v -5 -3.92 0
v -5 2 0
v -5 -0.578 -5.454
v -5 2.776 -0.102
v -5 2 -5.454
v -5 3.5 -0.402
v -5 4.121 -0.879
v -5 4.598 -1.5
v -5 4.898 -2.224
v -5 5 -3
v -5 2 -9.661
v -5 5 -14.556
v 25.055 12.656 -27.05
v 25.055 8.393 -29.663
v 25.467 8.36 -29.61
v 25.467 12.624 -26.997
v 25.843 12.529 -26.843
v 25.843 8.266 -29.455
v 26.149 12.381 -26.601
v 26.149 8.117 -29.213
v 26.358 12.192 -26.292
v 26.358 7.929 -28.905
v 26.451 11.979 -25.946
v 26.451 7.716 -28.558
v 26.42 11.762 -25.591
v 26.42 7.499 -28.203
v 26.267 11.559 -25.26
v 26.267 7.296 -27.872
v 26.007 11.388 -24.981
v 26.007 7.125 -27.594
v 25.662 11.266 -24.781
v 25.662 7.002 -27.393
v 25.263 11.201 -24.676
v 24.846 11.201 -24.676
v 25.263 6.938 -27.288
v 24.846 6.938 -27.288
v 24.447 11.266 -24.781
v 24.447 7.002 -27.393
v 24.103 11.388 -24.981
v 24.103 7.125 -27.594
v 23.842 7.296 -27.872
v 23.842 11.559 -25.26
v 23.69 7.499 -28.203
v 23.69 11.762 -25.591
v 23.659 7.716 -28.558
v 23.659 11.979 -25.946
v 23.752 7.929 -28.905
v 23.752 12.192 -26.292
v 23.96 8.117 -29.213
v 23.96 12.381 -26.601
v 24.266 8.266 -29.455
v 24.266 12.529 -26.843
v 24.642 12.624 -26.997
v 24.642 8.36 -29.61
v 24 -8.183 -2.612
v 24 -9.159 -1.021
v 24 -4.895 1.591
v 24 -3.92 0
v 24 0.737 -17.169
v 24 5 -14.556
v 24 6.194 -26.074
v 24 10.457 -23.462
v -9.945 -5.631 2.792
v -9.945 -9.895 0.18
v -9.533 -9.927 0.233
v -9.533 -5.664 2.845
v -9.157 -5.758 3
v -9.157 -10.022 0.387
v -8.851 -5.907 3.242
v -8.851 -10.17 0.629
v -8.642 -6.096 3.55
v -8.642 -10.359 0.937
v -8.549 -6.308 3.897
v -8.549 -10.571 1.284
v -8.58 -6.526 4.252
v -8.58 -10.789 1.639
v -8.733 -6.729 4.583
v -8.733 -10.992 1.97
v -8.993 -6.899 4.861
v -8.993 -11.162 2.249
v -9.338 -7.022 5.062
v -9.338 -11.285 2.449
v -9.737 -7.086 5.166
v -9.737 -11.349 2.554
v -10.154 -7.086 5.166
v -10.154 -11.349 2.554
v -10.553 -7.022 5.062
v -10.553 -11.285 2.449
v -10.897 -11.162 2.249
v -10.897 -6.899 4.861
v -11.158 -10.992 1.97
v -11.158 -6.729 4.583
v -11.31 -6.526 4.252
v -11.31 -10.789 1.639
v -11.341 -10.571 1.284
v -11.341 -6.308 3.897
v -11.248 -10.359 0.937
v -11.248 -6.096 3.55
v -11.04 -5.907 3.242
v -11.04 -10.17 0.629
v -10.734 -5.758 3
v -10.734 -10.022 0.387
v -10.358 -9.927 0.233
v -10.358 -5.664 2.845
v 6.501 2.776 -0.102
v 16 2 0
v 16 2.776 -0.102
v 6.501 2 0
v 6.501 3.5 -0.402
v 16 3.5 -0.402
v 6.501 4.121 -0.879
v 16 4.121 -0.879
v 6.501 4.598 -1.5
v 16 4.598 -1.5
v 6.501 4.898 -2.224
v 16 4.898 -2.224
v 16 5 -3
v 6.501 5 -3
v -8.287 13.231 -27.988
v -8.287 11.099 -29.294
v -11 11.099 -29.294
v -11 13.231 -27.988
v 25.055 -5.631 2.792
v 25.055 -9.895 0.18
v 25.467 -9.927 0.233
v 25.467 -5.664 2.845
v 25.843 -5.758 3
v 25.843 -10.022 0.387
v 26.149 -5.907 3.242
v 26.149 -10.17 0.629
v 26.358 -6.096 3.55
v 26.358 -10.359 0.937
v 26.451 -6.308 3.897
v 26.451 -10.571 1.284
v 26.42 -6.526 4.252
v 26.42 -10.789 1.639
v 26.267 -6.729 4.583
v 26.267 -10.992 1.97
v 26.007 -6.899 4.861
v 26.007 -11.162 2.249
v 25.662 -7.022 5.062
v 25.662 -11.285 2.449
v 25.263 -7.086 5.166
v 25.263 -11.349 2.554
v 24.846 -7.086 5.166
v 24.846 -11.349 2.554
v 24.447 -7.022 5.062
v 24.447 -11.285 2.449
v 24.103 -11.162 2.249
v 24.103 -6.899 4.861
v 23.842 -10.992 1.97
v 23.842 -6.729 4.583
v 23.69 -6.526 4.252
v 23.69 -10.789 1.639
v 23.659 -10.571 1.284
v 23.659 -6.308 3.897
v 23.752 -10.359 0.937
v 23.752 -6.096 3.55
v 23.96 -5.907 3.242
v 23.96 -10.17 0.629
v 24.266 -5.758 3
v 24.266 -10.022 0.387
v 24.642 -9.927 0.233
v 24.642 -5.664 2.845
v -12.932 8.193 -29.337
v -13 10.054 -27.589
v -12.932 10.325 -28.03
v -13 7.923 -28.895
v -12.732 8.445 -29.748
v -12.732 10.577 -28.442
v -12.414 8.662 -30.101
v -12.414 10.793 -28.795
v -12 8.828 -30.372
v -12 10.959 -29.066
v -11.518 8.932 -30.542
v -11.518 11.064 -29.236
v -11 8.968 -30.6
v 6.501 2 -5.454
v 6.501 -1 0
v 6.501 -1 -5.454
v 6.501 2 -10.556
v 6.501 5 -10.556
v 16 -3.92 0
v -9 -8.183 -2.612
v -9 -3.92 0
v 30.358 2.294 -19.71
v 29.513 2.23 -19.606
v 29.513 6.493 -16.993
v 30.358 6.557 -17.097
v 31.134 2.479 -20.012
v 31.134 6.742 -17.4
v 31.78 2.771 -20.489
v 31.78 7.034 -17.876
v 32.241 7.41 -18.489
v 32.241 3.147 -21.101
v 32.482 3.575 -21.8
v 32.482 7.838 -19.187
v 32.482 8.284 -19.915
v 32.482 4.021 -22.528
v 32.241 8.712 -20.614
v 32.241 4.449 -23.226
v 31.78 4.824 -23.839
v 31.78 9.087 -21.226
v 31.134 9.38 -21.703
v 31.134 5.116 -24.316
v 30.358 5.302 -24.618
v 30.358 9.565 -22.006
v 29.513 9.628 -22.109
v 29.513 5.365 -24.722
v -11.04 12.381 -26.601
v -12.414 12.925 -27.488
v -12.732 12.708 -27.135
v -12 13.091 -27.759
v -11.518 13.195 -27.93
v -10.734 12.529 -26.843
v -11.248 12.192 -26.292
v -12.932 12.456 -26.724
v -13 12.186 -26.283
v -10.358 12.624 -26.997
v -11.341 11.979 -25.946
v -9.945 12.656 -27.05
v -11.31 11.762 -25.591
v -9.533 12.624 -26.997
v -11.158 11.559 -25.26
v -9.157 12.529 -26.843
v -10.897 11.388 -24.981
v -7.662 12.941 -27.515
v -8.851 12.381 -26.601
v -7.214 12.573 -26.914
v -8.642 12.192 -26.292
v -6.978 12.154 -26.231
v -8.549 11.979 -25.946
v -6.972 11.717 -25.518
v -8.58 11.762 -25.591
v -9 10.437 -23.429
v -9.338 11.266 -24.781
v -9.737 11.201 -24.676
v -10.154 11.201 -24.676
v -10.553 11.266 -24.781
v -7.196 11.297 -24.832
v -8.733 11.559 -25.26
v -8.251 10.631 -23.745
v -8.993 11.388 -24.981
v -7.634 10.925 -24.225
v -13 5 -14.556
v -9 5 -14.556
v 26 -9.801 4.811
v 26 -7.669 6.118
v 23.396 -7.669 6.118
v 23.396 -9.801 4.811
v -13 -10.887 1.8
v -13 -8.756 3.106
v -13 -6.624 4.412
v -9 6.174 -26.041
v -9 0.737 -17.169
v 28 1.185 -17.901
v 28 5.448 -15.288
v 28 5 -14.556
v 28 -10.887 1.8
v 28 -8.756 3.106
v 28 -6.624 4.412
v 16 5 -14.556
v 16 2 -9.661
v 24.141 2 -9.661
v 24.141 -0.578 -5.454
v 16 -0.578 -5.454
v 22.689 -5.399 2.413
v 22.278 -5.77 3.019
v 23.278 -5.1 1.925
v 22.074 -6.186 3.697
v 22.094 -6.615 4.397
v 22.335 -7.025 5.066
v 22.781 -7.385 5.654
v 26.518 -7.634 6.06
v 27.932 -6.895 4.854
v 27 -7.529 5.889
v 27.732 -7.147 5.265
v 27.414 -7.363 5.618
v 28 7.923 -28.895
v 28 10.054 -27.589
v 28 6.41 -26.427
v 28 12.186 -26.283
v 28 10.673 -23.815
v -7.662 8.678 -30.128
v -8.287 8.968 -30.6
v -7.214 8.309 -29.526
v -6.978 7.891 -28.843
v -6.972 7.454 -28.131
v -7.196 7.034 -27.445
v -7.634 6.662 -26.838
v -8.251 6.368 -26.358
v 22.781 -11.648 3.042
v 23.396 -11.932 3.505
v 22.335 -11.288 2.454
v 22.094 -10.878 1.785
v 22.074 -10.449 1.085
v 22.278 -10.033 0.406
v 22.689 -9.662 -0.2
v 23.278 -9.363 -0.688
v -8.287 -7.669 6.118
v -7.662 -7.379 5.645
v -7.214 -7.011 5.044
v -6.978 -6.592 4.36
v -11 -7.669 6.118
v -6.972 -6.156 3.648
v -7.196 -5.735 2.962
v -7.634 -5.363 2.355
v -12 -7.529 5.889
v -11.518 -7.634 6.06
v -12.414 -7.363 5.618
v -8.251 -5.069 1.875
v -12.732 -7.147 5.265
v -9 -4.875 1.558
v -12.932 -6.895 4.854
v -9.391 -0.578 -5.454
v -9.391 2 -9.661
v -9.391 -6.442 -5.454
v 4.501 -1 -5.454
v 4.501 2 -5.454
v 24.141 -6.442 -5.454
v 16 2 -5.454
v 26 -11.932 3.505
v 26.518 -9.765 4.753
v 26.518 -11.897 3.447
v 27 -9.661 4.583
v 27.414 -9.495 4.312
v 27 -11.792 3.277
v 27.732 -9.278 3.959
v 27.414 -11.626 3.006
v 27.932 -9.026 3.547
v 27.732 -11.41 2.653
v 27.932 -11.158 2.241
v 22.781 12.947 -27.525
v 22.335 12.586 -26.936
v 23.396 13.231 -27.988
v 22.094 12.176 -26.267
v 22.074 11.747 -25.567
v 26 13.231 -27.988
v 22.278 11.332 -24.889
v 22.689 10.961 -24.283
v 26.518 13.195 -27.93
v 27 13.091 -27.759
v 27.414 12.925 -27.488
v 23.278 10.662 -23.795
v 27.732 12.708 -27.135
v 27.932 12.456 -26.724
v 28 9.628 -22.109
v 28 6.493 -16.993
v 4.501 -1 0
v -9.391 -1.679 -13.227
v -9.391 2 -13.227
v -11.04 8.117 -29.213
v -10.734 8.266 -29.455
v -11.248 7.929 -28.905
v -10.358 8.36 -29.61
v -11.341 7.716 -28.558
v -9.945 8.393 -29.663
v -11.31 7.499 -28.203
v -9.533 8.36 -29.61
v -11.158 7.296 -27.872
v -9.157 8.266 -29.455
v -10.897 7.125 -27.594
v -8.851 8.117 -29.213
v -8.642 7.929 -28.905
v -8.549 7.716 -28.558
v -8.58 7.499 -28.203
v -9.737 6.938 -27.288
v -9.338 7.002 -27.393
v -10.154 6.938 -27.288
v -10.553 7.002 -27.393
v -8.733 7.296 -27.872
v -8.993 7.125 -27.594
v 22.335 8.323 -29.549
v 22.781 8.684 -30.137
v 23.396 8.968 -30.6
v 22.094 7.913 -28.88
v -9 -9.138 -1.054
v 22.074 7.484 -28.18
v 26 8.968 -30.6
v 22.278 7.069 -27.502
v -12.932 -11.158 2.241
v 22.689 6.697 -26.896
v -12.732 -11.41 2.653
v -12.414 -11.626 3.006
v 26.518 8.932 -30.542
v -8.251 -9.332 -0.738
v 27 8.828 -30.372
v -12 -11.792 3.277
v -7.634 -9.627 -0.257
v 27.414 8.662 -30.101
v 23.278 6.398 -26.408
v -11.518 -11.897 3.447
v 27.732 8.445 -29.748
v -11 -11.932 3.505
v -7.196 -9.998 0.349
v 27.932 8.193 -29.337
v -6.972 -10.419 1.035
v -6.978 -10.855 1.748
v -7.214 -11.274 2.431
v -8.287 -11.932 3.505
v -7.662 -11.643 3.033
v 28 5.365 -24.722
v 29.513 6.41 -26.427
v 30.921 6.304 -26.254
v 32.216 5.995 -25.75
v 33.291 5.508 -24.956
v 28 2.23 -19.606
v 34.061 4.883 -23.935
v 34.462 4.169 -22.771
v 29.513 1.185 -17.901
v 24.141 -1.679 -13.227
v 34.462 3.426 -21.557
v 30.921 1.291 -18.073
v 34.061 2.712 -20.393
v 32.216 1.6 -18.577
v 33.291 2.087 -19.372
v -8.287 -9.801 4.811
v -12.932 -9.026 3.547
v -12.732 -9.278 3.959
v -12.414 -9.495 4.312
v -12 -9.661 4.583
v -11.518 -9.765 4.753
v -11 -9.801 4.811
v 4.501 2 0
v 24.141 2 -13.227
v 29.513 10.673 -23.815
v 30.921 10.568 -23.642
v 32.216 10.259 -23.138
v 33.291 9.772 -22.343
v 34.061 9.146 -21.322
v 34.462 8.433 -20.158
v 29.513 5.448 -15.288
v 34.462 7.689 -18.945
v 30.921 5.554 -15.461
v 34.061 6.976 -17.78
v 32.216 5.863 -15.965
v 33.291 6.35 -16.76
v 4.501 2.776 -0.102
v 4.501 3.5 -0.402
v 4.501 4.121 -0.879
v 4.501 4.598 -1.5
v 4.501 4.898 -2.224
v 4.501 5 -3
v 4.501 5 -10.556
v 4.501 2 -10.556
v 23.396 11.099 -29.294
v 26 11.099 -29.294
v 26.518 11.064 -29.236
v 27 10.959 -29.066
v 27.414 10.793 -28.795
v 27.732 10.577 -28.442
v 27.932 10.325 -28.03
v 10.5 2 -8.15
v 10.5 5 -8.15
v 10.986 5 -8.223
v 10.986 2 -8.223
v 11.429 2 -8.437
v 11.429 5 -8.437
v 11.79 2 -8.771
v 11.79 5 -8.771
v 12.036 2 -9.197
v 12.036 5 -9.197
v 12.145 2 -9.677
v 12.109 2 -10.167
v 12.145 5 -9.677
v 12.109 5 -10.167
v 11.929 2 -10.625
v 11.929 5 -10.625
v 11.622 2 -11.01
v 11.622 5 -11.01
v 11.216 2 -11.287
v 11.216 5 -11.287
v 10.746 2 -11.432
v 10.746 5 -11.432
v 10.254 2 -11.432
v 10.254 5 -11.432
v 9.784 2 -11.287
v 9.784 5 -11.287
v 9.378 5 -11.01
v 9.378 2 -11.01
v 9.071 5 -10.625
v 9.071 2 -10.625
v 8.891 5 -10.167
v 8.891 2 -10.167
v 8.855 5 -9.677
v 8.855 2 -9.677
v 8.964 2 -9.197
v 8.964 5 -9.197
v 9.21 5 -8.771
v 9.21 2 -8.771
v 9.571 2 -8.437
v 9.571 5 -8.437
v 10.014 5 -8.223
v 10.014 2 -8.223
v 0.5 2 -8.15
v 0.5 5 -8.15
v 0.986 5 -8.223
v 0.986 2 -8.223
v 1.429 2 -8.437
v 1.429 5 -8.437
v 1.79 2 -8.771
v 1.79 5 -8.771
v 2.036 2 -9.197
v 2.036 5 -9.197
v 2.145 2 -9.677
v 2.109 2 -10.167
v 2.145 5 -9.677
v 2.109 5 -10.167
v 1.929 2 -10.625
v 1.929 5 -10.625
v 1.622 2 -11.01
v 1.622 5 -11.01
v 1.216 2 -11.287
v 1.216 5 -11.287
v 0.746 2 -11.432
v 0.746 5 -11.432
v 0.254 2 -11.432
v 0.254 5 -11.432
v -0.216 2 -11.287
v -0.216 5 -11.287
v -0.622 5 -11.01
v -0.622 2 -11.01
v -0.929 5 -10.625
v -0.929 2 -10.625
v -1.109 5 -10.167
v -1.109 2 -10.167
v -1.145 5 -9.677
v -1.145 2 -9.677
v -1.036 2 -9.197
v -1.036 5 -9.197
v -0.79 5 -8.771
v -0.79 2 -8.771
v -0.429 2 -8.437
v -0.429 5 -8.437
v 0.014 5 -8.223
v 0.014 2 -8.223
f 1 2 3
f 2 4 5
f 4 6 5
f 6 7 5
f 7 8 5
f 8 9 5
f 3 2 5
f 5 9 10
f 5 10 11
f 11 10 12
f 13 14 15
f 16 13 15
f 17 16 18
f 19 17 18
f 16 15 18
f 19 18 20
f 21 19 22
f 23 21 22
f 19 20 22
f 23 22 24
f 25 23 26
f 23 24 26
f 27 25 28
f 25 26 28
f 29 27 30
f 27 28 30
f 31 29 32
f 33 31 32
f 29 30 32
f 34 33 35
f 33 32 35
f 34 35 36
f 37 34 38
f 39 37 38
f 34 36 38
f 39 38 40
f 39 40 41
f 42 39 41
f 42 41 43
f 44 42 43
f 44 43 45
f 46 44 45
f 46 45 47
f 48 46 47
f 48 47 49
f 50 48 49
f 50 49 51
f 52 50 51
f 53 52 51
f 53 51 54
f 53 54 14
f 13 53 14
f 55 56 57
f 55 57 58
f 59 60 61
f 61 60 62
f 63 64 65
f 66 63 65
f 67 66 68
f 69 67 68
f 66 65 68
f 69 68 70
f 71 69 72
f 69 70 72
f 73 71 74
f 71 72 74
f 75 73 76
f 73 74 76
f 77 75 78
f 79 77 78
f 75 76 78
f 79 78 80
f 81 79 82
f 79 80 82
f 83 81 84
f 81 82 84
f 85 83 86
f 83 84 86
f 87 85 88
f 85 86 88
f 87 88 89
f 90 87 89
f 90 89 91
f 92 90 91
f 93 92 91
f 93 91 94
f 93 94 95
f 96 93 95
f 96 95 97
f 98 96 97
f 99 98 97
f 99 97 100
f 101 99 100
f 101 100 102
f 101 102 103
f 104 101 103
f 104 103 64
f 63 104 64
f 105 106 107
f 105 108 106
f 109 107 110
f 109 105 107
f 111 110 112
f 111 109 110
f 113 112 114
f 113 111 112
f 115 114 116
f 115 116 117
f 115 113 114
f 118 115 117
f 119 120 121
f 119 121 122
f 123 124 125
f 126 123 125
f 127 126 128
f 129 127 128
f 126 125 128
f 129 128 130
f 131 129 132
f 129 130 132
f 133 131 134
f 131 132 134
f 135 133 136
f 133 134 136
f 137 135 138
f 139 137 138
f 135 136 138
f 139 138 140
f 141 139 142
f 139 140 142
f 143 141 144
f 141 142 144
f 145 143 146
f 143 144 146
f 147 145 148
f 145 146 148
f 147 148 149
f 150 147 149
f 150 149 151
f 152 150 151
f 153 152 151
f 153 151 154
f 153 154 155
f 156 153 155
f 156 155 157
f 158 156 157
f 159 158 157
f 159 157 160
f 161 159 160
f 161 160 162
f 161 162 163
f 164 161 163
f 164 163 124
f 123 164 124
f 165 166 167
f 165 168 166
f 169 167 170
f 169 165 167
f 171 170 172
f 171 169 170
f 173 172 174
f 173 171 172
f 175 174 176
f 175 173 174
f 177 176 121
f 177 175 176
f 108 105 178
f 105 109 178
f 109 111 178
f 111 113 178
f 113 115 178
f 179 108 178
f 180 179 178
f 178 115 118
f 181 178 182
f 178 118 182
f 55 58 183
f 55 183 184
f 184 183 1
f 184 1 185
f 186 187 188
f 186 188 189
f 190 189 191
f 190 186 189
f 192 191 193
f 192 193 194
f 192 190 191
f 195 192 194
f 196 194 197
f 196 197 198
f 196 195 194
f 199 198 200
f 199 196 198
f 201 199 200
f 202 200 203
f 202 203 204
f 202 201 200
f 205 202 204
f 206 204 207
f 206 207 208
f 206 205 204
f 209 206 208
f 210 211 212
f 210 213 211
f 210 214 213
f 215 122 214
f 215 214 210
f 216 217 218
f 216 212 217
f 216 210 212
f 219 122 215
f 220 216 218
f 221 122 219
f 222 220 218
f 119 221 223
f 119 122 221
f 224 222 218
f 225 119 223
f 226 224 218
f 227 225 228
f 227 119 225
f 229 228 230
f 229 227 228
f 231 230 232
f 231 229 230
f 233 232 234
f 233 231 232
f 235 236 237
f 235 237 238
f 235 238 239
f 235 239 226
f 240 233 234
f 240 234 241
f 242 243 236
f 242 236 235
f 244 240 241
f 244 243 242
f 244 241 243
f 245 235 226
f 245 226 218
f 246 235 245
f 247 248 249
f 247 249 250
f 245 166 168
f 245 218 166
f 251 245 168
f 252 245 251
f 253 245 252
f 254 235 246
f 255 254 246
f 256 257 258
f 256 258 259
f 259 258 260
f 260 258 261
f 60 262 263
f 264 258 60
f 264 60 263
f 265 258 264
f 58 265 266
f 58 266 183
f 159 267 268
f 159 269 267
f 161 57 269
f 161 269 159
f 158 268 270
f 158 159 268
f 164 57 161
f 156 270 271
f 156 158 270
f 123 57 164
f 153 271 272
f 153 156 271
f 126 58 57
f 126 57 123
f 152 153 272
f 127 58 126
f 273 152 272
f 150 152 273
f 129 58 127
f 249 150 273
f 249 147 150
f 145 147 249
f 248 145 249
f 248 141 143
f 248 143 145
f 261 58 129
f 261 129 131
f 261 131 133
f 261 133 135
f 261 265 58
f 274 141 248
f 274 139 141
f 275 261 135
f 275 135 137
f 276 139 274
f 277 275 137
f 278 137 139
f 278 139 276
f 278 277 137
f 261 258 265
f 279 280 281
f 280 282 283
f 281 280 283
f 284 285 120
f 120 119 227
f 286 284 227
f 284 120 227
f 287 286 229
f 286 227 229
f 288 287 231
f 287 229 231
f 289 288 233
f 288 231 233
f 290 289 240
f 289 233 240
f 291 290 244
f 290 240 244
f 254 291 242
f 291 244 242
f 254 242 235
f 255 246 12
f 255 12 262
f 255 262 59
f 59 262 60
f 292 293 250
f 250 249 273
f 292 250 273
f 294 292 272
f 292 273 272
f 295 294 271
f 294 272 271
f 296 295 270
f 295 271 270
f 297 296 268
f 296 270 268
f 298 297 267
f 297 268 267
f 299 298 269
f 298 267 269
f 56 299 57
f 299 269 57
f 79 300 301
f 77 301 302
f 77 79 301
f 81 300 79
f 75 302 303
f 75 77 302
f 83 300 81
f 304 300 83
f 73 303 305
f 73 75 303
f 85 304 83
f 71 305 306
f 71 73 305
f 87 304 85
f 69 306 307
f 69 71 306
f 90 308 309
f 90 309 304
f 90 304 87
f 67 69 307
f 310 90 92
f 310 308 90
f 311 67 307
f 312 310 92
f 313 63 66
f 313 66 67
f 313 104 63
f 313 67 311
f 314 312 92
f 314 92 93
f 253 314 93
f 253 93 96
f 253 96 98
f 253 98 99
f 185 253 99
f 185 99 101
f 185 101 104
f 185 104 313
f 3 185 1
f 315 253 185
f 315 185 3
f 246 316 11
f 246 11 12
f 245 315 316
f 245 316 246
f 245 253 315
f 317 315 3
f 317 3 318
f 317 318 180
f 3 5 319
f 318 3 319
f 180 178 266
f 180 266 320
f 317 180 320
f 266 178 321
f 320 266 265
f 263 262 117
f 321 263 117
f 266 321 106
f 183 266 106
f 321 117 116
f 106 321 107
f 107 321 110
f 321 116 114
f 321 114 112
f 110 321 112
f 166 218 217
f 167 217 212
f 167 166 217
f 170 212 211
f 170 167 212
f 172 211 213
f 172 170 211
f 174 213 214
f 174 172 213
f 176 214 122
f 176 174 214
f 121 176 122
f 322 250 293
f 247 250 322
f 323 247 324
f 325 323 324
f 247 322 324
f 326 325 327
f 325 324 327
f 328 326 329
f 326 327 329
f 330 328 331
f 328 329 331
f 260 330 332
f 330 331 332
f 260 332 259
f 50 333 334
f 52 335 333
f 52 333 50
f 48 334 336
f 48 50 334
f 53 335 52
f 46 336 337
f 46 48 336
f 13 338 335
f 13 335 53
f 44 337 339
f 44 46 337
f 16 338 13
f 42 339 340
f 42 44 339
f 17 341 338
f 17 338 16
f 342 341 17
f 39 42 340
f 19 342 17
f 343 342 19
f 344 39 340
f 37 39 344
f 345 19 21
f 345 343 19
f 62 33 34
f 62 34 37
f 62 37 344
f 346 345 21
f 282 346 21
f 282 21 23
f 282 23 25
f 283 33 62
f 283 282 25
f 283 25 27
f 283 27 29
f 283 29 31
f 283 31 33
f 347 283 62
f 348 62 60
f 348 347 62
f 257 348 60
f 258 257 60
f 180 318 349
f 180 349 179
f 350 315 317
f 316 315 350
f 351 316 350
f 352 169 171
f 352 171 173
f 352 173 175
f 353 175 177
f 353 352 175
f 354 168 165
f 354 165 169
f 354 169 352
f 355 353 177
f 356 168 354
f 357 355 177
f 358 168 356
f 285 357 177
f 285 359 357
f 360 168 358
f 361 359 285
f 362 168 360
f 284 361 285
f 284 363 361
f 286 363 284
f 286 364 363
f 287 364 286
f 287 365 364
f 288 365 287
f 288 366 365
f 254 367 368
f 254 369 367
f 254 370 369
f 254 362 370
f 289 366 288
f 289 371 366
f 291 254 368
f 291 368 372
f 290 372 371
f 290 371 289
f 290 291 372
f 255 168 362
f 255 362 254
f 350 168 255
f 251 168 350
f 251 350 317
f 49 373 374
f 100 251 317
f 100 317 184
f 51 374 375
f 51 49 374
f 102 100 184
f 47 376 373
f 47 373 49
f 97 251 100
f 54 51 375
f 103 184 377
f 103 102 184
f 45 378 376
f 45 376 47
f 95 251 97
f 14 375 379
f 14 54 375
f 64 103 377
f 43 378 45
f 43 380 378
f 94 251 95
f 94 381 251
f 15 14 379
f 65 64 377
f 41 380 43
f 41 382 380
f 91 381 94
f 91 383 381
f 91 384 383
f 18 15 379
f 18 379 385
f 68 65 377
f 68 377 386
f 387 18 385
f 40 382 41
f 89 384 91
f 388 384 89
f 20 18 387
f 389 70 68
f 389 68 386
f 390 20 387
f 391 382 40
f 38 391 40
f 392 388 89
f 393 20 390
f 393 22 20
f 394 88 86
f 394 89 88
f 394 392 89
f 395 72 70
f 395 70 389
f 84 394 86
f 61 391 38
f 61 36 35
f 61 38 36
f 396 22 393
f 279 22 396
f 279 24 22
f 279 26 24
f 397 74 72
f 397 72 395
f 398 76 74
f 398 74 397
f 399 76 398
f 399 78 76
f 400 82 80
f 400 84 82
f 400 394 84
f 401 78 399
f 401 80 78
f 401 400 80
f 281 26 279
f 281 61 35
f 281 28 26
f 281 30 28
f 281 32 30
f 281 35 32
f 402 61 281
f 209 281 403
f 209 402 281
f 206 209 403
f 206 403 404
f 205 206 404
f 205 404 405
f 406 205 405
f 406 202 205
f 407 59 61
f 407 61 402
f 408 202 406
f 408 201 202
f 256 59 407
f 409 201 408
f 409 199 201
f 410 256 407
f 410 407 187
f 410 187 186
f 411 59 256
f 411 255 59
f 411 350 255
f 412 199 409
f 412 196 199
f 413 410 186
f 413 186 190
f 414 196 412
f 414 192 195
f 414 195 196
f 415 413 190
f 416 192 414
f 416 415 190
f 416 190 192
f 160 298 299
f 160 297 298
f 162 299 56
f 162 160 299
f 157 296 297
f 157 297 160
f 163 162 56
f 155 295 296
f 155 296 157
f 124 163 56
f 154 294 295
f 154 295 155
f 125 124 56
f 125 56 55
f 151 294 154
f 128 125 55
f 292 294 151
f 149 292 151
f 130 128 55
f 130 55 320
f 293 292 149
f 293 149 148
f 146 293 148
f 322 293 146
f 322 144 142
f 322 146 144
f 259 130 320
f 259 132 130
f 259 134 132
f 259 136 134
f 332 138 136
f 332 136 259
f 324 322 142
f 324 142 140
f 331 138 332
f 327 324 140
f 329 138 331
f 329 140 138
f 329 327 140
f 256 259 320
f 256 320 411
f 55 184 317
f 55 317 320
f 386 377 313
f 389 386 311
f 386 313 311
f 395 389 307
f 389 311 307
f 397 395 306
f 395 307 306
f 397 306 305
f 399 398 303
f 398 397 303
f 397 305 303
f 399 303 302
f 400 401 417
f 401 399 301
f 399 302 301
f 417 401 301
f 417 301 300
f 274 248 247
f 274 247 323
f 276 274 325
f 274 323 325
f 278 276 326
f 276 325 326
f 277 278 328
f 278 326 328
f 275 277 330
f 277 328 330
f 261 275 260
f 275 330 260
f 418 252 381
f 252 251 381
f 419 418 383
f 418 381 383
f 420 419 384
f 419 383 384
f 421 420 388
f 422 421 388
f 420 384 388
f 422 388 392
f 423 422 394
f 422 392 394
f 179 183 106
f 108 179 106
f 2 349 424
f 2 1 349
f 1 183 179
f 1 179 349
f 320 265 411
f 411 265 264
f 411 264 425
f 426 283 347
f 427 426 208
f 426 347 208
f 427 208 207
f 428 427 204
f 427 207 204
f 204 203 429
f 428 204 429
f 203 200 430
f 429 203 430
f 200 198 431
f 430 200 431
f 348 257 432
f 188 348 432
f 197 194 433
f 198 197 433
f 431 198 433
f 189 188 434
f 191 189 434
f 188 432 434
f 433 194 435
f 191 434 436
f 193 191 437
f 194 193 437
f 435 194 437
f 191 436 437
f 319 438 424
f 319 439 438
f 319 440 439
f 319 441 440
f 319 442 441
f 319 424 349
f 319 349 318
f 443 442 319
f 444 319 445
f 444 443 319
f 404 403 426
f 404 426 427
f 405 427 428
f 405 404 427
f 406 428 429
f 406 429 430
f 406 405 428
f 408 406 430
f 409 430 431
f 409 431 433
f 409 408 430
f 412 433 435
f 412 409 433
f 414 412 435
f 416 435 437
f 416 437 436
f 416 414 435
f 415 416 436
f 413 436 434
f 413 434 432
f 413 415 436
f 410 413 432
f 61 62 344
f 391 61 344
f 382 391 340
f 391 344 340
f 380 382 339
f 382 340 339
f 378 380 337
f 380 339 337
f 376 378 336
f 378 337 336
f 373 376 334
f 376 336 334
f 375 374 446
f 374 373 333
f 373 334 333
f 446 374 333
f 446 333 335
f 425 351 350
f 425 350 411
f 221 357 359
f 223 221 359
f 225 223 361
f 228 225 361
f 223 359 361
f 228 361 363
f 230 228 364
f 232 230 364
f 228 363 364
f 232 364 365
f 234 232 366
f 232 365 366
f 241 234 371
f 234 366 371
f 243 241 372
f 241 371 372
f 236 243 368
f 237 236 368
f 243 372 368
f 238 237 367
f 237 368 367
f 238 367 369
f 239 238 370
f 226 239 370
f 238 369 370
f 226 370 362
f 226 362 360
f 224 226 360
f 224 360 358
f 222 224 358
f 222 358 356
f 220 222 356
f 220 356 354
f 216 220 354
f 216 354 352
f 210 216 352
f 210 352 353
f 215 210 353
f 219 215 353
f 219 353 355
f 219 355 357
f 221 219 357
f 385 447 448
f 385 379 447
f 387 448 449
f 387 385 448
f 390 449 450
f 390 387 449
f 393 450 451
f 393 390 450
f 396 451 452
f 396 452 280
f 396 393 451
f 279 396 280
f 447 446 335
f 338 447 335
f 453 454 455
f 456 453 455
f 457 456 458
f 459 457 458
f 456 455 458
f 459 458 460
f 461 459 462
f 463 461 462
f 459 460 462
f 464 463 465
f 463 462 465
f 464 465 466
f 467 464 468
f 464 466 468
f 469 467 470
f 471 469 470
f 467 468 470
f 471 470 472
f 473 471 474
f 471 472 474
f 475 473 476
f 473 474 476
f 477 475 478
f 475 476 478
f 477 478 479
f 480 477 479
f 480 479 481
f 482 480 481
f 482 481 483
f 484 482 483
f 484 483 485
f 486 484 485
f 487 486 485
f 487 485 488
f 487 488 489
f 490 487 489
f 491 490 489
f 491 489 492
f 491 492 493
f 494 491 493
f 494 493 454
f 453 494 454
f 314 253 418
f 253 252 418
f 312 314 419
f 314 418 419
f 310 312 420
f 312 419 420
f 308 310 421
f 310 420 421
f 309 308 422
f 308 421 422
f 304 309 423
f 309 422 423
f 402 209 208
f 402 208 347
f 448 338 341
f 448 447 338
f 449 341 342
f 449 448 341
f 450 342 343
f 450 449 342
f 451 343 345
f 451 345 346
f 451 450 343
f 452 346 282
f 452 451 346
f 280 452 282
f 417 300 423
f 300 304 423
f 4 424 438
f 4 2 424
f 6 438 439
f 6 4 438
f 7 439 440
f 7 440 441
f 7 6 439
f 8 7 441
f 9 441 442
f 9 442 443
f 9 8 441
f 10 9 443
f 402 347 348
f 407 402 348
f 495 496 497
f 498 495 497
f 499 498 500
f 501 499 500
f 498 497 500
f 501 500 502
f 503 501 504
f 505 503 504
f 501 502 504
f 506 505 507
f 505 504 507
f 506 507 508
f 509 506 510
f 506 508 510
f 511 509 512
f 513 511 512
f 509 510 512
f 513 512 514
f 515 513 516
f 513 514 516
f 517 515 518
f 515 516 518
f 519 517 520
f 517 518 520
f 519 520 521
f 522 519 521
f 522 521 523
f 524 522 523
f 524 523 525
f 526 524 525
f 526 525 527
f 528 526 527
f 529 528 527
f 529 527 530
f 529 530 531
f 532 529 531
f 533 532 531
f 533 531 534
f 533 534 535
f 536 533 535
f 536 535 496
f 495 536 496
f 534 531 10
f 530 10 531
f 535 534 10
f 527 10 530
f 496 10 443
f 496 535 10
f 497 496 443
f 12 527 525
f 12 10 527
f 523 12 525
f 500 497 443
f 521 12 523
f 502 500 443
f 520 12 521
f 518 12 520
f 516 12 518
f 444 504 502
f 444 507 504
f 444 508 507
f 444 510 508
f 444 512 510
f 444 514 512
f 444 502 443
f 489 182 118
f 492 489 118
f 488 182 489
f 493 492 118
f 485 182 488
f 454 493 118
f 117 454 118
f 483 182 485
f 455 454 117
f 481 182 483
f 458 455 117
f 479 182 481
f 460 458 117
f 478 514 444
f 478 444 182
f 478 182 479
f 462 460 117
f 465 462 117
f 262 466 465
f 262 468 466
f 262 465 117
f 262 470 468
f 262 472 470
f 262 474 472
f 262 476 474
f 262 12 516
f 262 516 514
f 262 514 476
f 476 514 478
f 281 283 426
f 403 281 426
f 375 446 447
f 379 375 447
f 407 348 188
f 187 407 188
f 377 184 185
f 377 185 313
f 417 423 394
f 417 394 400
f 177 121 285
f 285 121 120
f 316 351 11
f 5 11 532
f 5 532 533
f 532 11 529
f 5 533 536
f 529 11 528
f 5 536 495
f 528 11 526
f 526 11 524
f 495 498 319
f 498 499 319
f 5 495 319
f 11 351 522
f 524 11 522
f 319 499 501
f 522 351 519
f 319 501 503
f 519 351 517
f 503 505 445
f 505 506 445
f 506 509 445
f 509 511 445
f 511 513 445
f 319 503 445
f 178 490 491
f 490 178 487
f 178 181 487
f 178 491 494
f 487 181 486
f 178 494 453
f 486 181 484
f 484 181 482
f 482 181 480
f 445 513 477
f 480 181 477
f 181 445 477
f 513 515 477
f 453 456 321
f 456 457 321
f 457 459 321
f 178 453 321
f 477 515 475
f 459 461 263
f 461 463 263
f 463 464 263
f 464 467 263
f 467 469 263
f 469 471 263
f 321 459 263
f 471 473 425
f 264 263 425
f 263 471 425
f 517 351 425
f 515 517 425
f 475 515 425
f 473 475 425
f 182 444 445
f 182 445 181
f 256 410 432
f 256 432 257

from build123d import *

# Parameters (mm, degrees)
SKETCH_1_W                  = 28
SKETCH_1_H                  = 15
EXTRUDE_1_DEPTH             = 5
EXTRUDE_2_DEPTH             = 13
EXTRUDE_2_DIRECTION_2_REACH = 34.156
CUT_EXTRUDE_1_DEPTH         = 53.098032867
SKETCH_8_W                  = 41
SKETCH_8_H                  = 40
EXTRUDE_3_DEPTH             = 2.5
SKETCH_4_R                  = 1.4
CUT_EXTRUDE_2_DEPTH         = 7
SKETCH_5_R                  = 1.65
CUT_EXTRUDE_3_DEPTH         = 45.800573211
SKETCH_6_W                  = 33.531677497
SKETCH_6_H                  = 7.773496997
CUT_EXTRUDE_4_DEPTH         = 11
FILLET_1_R                  = 2
CUT_EXTRUDE_5_DEPTH         = 44.302936624
SKETCH_10_W                 = 2
SKETCH_10_H                 = 11.556486704
CUT_EXTRUDE_6_DEPTH         = 6
CUT_EXTRUDE_8_DEPTH         = 8
CUT_EXTRUDE_9_DEPTH         = 12
FILLET_2_R                  = 3
EXTRUDE_4_DEPTH             = 5


with BuildPart() as part:
    # 草图1 → 凸台-拉伸1 (new body)
    with BuildSketch(Plane(origin=(0, 0, 0), x_dir=(1, 0, 0), z_dir=(0, 1, 0))):
        with Locations((14, 7.5)):
            Rectangle(SKETCH_1_W, SKETCH_1_H)
    extrude(amount=EXTRUDE_1_DEPTH)

    # 草图2 → 凸台-拉伸2 (add)
    with BuildSketch(Plane.ZY):
        Polygon((4.811400568, -9.800725827), (-29.294206006, 11.099216762), (-27.987959594, 13.230817173), (-14.556486704, 5), (0, 5), (0, 0), (0, -3.920226525), (6.11764698, -7.669125416), align=None)
    extrude(amount=EXTRUDE_2_DEPTH)

    # 凸台-拉伸2 direction 2: up to this face of the body (flat: up to its plane)
    extrude_2_direction_2_end = Plane(part.part.faces().sort_by_distance((28, 2.5, -7.5))[0])
    # 草图2 → 凸台-拉伸2 direction 2 (add, up to the picked face)
    with BuildSketch(Plane.ZY, mode=Mode.PRIVATE) as extrude_2_direction_2_sk1:
        Polygon((4.811400568, -9.800725827), (-29.294206006, 11.099216762), (-27.987959594, 13.230817173), (-14.556486704, 5), (0, 5), (0, 0), (0, -3.920226525), (6.11764698, -7.669125416), align=None)
    extrude_2_direction_2_tool1 = split(extrude(extrude_2_direction_2_sk1.sketch, amount=-EXTRUDE_2_DIRECTION_2_REACH, mode=Mode.PRIVATE), bisect_by=extrude_2_direction_2_end, keep=Keep.BOTH, mode=Mode.PRIVATE)
    add(extrude_2_direction_2_tool1.solids().sort_by(Axis((0, 1.837688, -8.936549), (1, 0, 0)))[0])

    # 草图3 → 切除-拉伸1 (cut, through all)
    with BuildSketch(Plane.ZY.offset(13)):
        Polygon((-15, 0), (-11.181930407, 0), (-15, 2.339716056), align=None)
    extrude(amount=-CUT_EXTRUDE_1_DEPTH, mode=Mode.SUBTRACT)

    # 草图8 → 凸台-拉伸3 (add)
    with BuildSketch(Plane(origin=(0, -4.981586473, -3.052720117), x_dir=(1, 0, 0), z_dir=(0, -0.8526401643540905, -0.5224985647159519))):
        with Locations((7.5, -10.776741451)):
            Rectangle(SKETCH_8_W, SKETCH_8_H)
    extrude(amount=EXTRUDE_3_DEPTH)

    # 草图4 → 切除-拉伸2 (cut)
    with BuildSketch(Plane(origin=(0, -7.113186884, -4.358966529), x_dir=(1, 0, 0), z_dir=(0, -0.8526401643540905, -0.5224985647159519))):
        with Locations(Location((-9.945229951, 6.723258549, 0), (0, 0, 270))):
            Circle(SKETCH_4_R)
        with Locations(Location((25.054770049, 6.723258549, 0), (0, 0, 270))):
            Circle(SKETCH_4_R)
        with Locations(Location((25.054770049, -28.276741451, 0), (0, 0, 270))):
            Circle(SKETCH_4_R)
        with Locations(Location((-9.945229951, -28.276741451, 0), (0, 0, 270))):
            Circle(SKETCH_4_R)
    extrude(amount=-CUT_EXTRUDE_2_DEPTH, mode=Mode.SUBTRACT)

    # 草图5 → 切除-拉伸3 (cut, through all)
    with BuildSketch(Plane(origin=(0, 5, 0), x_dir=(1, 0, 0), z_dir=(0, 1, 0))):
        with Locations(Location((10.5, 9.8, 0), (0, 0, 270))):
            Circle(SKETCH_5_R)
        with Locations(Location((0.5, 9.8, 0), (0, 0, 270))):
            Circle(SKETCH_5_R)
    extrude(amount=-CUT_EXTRUDE_3_DEPTH, mode=Mode.SUBTRACT)

    # 草图6 → 切除-拉伸4 (cut)
    with BuildSketch(Plane(origin=(0, 2, 0), x_dir=(1, 0, 0), z_dir=(0, 1, 0))):
        with Locations((7.374838624, 9.340740808)):
            Rectangle(SKETCH_6_W, SKETCH_6_H)
    extrude(amount=-CUT_EXTRUDE_4_DEPTH, mode=Mode.SUBTRACT)

    # 圆角1
    fillet_1_edges = [part.edges().sort_by_distance(p)[0] for p in [
        (28, 11.099216762, -29.294206006),
        (28, -9.800725827, 4.811400568),
        (-13, -9.800725827, 4.811400568),
        (-13, 11.099216762, -29.294206006),
    ]]
    fillet(fillet_1_edges, radius=FILLET_1_R)

    # 草图9 → 切除-拉伸5 (cut, through all)
    with BuildSketch(Plane(origin=(0, -2.849986062, -1.746473705), x_dir=(1, 0, 0), z_dir=(0, 0.8526401643540904, 0.5224985647159519))):
        with BuildLine():
            Line((-8.286917555, -9.223258549), (23.396457654, -9.223258549))
            ThreePointArc((23.396457654, -9.223258549), (22.073973693, -6.384358742), (24, -3.914796311))
            Line((24, -3.914796311), (24, -2.048312733))
            Line((24, -2.048312733), (-9, -2.048312733))
            Line((-9, -2.048312733), (-9, -3.876059866))
            ThreePointArc((-9, -3.876059866), (-6.971555183, -6.326700388), (-8.286917555, -9.223258549))
        make_face()
        with BuildLine():
            Line((-9, 19.02393804), (-9, 15.02393804))
            Line((-9, 15.02393804), (24, 15.02393804))
            Line((24, 15.02393804), (24, 19.02393804))
            Line((24, 19.02393804), (24, 25.468279213))
            ThreePointArc((24, 25.468279213), (22.073973693, 27.937841645), (23.396457654, 30.776741451))
            Line((23.396457654, 30.776741451), (-8.286917555, 30.776741451))
            ThreePointArc((-8.286917555, 30.776741451), (-6.971555183, 27.880183291), (-9, 25.429542768))
            Line((-9, 25.429542768), (-9, 19.02393804))
        make_face()
    extrude(amount=-CUT_EXTRUDE_5_DEPTH, mode=Mode.SUBTRACT)

    # 草图10 → 切除-拉伸6 (cut)
    with BuildSketch(Plane(origin=(0, 5, 0), x_dir=(1, 0, 0), z_dir=(0, 1, 0))):
        with Locations((5.501092332, 4.778243352)):
            Rectangle(SKETCH_10_W, SKETCH_10_H)
    extrude(amount=-CUT_EXTRUDE_6_DEPTH, mode=Mode.SUBTRACT)

    # 草图11 → 切除-拉伸8 (cut)
    with BuildSketch(Plane.ZY.offset(13)):
        Polygon((0, -3.920226525), (-14.556486704, 5), (0, 5), align=None)
    extrude(amount=-CUT_EXTRUDE_8_DEPTH, mode=Mode.SUBTRACT)

    # 草图12 → 切除-拉伸9 (cut)
    with BuildSketch(Plane(origin=(28, 0, 0), x_dir=(0, 0, -1), z_dir=(1, 0, 0))):
        Polygon((14.556486704, 5), (0, -3.920226525), (0, 5), align=None)
    extrude(amount=-CUT_EXTRUDE_9_DEPTH, mode=Mode.SUBTRACT)

    # 圆角2
    fillet_2_edges = [part.edges().sort_by_distance(p)[0] for p in [
        (11.250546166, 5, 0),
        (-0.249453834, 5, 0),
    ]]
    fillet(fillet_2_edges, radius=FILLET_2_R)

    # 草图13 → 凸台-拉伸4 (add)
    with BuildSketch(Plane(origin=(0, -7.113186884, -4.358966529), x_dir=(1, 0, 0), z_dir=(0, -0.8526401643540905, -0.5224985647159519))):
        with BuildLine():
            Line((27.203064282, -17.882084245), (29.512557602, -17.882084245))
            ThreePointArc((29.512557602, -17.882084245), (32.512557602, -20.882084245), (29.512557602, -23.882084245))
            Line((29.512557602, -23.882084245), (27.203064282, -23.882084245))
            Line((27.203064282, -23.882084245), (27.203064282, -25.882084245))
            Line((27.203064282, -25.882084245), (29.512557602, -25.882084245))
            ThreePointArc((29.512557602, -25.882084245), (34.512557602, -20.882084245), (29.512557602, -15.882084245))
            Line((29.512557602, -15.882084245), (27.203064282, -15.882084245))
            Line((27.203064282, -15.882084245), (27.203064282, -17.882084245))
        make_face()
    extrude(amount=-EXTRUDE_4_DEPTH)


solid = part.part
